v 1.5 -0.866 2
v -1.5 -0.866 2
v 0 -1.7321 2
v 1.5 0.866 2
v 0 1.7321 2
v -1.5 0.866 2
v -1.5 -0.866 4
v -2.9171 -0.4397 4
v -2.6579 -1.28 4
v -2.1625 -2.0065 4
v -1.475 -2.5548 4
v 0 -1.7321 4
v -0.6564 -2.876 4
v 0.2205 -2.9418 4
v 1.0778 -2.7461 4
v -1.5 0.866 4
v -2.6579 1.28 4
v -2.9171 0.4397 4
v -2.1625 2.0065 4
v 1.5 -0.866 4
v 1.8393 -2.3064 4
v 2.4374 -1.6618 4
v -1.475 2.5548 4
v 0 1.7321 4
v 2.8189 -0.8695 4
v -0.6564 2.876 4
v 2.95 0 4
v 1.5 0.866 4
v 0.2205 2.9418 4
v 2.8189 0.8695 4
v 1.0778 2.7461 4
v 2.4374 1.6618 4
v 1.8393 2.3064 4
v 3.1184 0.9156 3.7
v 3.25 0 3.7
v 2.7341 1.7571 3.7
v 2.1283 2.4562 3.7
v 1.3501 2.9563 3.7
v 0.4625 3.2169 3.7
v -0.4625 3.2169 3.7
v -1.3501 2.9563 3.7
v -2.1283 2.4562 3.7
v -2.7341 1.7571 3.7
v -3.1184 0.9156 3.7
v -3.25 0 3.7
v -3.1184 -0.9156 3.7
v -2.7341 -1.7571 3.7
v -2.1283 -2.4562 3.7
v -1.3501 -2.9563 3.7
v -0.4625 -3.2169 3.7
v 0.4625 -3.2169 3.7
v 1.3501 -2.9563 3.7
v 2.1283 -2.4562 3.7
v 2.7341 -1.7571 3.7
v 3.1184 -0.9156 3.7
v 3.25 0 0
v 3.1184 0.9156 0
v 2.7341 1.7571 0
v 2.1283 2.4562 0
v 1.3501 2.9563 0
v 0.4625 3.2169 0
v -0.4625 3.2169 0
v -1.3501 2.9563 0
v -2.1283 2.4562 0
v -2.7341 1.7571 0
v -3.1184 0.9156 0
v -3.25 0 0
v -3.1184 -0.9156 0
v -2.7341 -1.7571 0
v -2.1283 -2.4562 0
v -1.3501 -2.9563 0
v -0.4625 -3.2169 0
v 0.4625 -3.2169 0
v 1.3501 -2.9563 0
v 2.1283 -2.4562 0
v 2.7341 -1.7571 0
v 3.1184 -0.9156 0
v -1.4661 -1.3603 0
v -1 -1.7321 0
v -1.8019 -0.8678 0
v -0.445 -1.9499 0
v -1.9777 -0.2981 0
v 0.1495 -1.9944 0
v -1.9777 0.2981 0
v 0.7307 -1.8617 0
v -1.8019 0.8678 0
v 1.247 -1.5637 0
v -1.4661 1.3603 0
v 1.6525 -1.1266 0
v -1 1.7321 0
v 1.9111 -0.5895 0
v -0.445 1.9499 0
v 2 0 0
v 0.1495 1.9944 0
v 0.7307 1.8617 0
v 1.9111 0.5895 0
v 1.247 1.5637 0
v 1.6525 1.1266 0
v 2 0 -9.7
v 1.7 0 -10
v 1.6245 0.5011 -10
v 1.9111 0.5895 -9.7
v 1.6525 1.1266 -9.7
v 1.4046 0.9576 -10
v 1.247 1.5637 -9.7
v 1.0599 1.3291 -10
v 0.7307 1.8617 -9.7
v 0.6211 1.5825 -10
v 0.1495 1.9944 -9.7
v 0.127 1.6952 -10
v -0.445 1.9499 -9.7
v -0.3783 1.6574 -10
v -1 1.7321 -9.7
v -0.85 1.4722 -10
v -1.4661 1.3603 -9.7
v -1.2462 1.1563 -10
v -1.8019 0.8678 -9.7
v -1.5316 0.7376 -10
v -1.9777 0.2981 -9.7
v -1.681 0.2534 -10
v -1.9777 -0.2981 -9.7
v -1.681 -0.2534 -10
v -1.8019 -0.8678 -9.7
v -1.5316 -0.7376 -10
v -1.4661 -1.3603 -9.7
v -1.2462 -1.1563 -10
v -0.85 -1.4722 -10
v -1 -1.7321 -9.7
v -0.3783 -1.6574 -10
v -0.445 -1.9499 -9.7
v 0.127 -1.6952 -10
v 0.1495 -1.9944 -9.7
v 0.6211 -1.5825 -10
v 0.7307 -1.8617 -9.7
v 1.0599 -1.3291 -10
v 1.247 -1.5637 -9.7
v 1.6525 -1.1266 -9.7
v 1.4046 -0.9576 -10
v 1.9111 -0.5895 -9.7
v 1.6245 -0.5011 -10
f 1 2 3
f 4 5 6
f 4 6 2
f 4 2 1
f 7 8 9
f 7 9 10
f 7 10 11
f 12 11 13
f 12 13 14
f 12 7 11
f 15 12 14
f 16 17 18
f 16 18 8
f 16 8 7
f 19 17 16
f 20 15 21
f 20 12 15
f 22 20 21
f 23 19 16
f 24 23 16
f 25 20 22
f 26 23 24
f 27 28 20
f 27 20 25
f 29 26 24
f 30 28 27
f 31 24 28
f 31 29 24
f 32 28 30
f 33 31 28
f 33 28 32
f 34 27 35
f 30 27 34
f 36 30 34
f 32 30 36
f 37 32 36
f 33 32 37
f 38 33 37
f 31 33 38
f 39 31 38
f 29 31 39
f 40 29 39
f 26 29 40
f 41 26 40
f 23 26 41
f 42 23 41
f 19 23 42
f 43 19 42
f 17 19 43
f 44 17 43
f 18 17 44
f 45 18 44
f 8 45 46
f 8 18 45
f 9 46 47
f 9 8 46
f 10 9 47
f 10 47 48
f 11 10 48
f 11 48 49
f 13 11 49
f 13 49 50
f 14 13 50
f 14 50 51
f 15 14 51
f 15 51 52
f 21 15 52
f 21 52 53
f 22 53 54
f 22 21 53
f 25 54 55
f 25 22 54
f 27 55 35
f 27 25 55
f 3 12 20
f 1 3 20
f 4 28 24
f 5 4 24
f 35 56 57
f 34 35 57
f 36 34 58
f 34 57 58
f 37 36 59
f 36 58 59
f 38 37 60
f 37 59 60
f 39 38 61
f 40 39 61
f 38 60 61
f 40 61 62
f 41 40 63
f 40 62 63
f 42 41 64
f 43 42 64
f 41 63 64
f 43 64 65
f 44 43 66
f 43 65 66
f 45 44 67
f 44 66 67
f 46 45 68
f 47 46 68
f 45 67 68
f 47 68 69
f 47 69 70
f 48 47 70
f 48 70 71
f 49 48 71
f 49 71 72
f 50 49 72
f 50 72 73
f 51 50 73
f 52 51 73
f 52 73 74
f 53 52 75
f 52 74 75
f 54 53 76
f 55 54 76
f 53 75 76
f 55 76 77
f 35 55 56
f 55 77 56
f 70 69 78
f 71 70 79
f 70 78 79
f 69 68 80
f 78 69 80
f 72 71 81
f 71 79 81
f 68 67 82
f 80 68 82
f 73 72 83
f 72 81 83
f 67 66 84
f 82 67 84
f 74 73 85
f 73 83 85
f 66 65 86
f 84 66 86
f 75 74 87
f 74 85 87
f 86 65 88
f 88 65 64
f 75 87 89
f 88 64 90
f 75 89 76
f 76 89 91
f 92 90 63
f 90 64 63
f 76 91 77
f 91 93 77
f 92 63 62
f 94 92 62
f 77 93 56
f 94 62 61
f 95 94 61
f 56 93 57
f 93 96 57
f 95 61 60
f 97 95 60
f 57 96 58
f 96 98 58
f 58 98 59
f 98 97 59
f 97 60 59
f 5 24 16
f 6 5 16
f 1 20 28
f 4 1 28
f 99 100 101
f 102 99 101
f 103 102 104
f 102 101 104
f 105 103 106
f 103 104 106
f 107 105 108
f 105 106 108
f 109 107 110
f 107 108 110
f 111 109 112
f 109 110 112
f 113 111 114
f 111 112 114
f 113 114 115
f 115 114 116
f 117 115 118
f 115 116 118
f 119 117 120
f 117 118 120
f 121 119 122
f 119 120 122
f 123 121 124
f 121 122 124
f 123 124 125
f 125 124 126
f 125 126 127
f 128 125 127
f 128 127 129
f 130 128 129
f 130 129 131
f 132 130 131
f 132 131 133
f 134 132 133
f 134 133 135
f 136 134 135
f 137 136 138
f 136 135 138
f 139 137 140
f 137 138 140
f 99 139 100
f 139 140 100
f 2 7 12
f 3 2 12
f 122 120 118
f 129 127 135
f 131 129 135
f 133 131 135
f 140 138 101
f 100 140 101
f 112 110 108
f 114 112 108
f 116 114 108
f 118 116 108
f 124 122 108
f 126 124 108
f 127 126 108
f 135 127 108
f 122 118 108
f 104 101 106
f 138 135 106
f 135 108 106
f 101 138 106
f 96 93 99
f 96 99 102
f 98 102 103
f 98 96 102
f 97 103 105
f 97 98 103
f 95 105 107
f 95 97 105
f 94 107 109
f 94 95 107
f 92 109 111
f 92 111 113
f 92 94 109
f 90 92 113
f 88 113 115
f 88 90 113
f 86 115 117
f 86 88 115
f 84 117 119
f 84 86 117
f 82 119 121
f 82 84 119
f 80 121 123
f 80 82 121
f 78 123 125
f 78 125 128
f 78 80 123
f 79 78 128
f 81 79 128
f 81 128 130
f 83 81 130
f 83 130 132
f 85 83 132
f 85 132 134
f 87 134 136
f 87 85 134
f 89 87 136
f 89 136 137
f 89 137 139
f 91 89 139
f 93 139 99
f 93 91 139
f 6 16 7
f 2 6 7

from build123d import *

# Parameters (mm, degrees)
F2_R      = 2
F3_DEPTH  = 10
F2_R_2    = 3.25
F3_FACE_R = 2
F4_DEPTH  = 4
F5_SIZE   = 0.3
F7_DEPTH  = 2


with BuildPart() as f3:
    # F2 (on Top) → F3 (new body)
    with BuildSketch(Plane.XY):
        Circle(F2_R)
    extrude(amount=-F3_DEPTH)

    # F2 (on Top) + F3_face (on face) → F4 (join)
    with BuildSketch(Plane.XY):
        Circle(F2_R_2)
        Circle(F2_R, mode=Mode.SUBTRACT)
    with BuildSketch(Plane.XY):
        Circle(F3_FACE_R)
    extrude(amount=F4_DEPTH)

    # F5
    f5_edges = [f3.edges().sort_by_distance(p)[0] for p in [
        (-2, 0, -10),
        (-3.25, 0, 4),
    ]]
    chamfer(f5_edges, length=F5_SIZE)

    # F6 (on face) → F7 (cut)
    with BuildSketch(Plane.XY.offset(4)):
        Polygon((1.5, -0.8660254038), (1.5, 0.8660254038), (0, 1.7320508076), (-1.5, 0.8660254038), (-1.5, -0.8660254038), (0, -1.7320508076), align=None)
    extrude(amount=-F7_DEPTH, mode=Mode.SUBTRACT)


solid = f3.part
